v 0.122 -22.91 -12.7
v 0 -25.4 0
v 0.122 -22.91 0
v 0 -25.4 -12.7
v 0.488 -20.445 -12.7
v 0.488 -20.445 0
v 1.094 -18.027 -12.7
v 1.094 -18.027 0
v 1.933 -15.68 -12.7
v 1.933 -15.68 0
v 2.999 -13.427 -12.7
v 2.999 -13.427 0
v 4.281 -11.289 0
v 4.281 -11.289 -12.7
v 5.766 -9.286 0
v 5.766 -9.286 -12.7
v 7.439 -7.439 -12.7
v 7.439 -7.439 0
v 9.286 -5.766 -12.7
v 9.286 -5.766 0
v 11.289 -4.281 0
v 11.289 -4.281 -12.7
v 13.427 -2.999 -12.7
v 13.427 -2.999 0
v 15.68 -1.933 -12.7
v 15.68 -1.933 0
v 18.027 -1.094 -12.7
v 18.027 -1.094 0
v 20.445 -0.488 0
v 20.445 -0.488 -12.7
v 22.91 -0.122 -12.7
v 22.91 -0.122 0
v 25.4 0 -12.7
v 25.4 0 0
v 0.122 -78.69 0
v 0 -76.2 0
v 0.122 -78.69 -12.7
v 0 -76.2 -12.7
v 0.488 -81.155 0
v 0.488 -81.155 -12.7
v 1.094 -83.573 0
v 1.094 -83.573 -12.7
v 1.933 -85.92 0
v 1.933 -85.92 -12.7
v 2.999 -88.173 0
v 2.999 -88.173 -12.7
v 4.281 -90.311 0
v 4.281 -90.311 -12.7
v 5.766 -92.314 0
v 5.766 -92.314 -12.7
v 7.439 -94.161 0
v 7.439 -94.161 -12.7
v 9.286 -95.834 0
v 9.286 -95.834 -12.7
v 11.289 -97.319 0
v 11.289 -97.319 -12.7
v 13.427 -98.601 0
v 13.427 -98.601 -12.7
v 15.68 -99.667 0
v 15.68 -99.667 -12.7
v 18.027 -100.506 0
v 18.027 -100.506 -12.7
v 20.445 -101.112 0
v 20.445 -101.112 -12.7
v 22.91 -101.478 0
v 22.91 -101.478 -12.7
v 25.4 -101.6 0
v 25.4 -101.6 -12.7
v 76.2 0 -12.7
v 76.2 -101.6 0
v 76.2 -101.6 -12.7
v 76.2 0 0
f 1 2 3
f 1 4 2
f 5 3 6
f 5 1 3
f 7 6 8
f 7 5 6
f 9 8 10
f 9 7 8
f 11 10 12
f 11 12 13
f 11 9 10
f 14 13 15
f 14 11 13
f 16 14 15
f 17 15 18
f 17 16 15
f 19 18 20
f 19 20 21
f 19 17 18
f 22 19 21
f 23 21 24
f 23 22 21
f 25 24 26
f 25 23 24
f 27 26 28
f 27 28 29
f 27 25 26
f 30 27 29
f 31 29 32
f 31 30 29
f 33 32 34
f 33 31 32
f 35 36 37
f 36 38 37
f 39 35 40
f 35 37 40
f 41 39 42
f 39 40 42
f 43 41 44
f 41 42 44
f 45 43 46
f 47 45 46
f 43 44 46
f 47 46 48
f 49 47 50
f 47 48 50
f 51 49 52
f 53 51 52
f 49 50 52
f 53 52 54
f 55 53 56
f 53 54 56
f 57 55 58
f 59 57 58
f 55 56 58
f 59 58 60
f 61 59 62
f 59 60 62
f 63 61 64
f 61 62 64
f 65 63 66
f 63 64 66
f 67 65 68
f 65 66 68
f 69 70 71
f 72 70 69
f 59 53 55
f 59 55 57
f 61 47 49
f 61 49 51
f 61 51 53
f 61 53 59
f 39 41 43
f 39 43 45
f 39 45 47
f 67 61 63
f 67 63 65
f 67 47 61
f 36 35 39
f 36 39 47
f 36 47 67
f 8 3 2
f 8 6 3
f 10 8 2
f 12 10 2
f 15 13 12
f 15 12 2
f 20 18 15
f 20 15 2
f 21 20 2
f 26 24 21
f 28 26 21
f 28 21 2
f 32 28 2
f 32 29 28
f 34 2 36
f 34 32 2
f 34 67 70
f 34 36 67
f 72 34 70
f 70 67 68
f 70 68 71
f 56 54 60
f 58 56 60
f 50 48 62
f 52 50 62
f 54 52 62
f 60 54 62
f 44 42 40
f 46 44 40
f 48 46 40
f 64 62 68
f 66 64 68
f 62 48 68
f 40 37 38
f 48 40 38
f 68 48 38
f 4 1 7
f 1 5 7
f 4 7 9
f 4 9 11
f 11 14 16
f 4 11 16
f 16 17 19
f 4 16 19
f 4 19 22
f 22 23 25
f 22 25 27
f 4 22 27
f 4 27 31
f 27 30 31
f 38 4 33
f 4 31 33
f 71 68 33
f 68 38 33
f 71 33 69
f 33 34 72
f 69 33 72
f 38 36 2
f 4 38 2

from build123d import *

# Parameters (mm, degrees)
F0_W     = 76.2
F0_H     = 101.6
F1_DEPTH = 12.7
F2_R     = 25.4


with BuildPart() as f1:
    # F0 (on Top) → F1 (new body)
    with BuildSketch(Plane.XY):
        with Locations((38.1, -50.8)):
            Rectangle(F0_W, F0_H)
    extrude(amount=-F1_DEPTH)

    # F2
    f2_edges = [f1.edges().sort_by_distance(p)[0] for p in [
        (0, 0, -6.35),
        (0, -101.6, -6.35),
    ]]
    fillet(f2_edges, radius=F2_R)


solid = f1.part
